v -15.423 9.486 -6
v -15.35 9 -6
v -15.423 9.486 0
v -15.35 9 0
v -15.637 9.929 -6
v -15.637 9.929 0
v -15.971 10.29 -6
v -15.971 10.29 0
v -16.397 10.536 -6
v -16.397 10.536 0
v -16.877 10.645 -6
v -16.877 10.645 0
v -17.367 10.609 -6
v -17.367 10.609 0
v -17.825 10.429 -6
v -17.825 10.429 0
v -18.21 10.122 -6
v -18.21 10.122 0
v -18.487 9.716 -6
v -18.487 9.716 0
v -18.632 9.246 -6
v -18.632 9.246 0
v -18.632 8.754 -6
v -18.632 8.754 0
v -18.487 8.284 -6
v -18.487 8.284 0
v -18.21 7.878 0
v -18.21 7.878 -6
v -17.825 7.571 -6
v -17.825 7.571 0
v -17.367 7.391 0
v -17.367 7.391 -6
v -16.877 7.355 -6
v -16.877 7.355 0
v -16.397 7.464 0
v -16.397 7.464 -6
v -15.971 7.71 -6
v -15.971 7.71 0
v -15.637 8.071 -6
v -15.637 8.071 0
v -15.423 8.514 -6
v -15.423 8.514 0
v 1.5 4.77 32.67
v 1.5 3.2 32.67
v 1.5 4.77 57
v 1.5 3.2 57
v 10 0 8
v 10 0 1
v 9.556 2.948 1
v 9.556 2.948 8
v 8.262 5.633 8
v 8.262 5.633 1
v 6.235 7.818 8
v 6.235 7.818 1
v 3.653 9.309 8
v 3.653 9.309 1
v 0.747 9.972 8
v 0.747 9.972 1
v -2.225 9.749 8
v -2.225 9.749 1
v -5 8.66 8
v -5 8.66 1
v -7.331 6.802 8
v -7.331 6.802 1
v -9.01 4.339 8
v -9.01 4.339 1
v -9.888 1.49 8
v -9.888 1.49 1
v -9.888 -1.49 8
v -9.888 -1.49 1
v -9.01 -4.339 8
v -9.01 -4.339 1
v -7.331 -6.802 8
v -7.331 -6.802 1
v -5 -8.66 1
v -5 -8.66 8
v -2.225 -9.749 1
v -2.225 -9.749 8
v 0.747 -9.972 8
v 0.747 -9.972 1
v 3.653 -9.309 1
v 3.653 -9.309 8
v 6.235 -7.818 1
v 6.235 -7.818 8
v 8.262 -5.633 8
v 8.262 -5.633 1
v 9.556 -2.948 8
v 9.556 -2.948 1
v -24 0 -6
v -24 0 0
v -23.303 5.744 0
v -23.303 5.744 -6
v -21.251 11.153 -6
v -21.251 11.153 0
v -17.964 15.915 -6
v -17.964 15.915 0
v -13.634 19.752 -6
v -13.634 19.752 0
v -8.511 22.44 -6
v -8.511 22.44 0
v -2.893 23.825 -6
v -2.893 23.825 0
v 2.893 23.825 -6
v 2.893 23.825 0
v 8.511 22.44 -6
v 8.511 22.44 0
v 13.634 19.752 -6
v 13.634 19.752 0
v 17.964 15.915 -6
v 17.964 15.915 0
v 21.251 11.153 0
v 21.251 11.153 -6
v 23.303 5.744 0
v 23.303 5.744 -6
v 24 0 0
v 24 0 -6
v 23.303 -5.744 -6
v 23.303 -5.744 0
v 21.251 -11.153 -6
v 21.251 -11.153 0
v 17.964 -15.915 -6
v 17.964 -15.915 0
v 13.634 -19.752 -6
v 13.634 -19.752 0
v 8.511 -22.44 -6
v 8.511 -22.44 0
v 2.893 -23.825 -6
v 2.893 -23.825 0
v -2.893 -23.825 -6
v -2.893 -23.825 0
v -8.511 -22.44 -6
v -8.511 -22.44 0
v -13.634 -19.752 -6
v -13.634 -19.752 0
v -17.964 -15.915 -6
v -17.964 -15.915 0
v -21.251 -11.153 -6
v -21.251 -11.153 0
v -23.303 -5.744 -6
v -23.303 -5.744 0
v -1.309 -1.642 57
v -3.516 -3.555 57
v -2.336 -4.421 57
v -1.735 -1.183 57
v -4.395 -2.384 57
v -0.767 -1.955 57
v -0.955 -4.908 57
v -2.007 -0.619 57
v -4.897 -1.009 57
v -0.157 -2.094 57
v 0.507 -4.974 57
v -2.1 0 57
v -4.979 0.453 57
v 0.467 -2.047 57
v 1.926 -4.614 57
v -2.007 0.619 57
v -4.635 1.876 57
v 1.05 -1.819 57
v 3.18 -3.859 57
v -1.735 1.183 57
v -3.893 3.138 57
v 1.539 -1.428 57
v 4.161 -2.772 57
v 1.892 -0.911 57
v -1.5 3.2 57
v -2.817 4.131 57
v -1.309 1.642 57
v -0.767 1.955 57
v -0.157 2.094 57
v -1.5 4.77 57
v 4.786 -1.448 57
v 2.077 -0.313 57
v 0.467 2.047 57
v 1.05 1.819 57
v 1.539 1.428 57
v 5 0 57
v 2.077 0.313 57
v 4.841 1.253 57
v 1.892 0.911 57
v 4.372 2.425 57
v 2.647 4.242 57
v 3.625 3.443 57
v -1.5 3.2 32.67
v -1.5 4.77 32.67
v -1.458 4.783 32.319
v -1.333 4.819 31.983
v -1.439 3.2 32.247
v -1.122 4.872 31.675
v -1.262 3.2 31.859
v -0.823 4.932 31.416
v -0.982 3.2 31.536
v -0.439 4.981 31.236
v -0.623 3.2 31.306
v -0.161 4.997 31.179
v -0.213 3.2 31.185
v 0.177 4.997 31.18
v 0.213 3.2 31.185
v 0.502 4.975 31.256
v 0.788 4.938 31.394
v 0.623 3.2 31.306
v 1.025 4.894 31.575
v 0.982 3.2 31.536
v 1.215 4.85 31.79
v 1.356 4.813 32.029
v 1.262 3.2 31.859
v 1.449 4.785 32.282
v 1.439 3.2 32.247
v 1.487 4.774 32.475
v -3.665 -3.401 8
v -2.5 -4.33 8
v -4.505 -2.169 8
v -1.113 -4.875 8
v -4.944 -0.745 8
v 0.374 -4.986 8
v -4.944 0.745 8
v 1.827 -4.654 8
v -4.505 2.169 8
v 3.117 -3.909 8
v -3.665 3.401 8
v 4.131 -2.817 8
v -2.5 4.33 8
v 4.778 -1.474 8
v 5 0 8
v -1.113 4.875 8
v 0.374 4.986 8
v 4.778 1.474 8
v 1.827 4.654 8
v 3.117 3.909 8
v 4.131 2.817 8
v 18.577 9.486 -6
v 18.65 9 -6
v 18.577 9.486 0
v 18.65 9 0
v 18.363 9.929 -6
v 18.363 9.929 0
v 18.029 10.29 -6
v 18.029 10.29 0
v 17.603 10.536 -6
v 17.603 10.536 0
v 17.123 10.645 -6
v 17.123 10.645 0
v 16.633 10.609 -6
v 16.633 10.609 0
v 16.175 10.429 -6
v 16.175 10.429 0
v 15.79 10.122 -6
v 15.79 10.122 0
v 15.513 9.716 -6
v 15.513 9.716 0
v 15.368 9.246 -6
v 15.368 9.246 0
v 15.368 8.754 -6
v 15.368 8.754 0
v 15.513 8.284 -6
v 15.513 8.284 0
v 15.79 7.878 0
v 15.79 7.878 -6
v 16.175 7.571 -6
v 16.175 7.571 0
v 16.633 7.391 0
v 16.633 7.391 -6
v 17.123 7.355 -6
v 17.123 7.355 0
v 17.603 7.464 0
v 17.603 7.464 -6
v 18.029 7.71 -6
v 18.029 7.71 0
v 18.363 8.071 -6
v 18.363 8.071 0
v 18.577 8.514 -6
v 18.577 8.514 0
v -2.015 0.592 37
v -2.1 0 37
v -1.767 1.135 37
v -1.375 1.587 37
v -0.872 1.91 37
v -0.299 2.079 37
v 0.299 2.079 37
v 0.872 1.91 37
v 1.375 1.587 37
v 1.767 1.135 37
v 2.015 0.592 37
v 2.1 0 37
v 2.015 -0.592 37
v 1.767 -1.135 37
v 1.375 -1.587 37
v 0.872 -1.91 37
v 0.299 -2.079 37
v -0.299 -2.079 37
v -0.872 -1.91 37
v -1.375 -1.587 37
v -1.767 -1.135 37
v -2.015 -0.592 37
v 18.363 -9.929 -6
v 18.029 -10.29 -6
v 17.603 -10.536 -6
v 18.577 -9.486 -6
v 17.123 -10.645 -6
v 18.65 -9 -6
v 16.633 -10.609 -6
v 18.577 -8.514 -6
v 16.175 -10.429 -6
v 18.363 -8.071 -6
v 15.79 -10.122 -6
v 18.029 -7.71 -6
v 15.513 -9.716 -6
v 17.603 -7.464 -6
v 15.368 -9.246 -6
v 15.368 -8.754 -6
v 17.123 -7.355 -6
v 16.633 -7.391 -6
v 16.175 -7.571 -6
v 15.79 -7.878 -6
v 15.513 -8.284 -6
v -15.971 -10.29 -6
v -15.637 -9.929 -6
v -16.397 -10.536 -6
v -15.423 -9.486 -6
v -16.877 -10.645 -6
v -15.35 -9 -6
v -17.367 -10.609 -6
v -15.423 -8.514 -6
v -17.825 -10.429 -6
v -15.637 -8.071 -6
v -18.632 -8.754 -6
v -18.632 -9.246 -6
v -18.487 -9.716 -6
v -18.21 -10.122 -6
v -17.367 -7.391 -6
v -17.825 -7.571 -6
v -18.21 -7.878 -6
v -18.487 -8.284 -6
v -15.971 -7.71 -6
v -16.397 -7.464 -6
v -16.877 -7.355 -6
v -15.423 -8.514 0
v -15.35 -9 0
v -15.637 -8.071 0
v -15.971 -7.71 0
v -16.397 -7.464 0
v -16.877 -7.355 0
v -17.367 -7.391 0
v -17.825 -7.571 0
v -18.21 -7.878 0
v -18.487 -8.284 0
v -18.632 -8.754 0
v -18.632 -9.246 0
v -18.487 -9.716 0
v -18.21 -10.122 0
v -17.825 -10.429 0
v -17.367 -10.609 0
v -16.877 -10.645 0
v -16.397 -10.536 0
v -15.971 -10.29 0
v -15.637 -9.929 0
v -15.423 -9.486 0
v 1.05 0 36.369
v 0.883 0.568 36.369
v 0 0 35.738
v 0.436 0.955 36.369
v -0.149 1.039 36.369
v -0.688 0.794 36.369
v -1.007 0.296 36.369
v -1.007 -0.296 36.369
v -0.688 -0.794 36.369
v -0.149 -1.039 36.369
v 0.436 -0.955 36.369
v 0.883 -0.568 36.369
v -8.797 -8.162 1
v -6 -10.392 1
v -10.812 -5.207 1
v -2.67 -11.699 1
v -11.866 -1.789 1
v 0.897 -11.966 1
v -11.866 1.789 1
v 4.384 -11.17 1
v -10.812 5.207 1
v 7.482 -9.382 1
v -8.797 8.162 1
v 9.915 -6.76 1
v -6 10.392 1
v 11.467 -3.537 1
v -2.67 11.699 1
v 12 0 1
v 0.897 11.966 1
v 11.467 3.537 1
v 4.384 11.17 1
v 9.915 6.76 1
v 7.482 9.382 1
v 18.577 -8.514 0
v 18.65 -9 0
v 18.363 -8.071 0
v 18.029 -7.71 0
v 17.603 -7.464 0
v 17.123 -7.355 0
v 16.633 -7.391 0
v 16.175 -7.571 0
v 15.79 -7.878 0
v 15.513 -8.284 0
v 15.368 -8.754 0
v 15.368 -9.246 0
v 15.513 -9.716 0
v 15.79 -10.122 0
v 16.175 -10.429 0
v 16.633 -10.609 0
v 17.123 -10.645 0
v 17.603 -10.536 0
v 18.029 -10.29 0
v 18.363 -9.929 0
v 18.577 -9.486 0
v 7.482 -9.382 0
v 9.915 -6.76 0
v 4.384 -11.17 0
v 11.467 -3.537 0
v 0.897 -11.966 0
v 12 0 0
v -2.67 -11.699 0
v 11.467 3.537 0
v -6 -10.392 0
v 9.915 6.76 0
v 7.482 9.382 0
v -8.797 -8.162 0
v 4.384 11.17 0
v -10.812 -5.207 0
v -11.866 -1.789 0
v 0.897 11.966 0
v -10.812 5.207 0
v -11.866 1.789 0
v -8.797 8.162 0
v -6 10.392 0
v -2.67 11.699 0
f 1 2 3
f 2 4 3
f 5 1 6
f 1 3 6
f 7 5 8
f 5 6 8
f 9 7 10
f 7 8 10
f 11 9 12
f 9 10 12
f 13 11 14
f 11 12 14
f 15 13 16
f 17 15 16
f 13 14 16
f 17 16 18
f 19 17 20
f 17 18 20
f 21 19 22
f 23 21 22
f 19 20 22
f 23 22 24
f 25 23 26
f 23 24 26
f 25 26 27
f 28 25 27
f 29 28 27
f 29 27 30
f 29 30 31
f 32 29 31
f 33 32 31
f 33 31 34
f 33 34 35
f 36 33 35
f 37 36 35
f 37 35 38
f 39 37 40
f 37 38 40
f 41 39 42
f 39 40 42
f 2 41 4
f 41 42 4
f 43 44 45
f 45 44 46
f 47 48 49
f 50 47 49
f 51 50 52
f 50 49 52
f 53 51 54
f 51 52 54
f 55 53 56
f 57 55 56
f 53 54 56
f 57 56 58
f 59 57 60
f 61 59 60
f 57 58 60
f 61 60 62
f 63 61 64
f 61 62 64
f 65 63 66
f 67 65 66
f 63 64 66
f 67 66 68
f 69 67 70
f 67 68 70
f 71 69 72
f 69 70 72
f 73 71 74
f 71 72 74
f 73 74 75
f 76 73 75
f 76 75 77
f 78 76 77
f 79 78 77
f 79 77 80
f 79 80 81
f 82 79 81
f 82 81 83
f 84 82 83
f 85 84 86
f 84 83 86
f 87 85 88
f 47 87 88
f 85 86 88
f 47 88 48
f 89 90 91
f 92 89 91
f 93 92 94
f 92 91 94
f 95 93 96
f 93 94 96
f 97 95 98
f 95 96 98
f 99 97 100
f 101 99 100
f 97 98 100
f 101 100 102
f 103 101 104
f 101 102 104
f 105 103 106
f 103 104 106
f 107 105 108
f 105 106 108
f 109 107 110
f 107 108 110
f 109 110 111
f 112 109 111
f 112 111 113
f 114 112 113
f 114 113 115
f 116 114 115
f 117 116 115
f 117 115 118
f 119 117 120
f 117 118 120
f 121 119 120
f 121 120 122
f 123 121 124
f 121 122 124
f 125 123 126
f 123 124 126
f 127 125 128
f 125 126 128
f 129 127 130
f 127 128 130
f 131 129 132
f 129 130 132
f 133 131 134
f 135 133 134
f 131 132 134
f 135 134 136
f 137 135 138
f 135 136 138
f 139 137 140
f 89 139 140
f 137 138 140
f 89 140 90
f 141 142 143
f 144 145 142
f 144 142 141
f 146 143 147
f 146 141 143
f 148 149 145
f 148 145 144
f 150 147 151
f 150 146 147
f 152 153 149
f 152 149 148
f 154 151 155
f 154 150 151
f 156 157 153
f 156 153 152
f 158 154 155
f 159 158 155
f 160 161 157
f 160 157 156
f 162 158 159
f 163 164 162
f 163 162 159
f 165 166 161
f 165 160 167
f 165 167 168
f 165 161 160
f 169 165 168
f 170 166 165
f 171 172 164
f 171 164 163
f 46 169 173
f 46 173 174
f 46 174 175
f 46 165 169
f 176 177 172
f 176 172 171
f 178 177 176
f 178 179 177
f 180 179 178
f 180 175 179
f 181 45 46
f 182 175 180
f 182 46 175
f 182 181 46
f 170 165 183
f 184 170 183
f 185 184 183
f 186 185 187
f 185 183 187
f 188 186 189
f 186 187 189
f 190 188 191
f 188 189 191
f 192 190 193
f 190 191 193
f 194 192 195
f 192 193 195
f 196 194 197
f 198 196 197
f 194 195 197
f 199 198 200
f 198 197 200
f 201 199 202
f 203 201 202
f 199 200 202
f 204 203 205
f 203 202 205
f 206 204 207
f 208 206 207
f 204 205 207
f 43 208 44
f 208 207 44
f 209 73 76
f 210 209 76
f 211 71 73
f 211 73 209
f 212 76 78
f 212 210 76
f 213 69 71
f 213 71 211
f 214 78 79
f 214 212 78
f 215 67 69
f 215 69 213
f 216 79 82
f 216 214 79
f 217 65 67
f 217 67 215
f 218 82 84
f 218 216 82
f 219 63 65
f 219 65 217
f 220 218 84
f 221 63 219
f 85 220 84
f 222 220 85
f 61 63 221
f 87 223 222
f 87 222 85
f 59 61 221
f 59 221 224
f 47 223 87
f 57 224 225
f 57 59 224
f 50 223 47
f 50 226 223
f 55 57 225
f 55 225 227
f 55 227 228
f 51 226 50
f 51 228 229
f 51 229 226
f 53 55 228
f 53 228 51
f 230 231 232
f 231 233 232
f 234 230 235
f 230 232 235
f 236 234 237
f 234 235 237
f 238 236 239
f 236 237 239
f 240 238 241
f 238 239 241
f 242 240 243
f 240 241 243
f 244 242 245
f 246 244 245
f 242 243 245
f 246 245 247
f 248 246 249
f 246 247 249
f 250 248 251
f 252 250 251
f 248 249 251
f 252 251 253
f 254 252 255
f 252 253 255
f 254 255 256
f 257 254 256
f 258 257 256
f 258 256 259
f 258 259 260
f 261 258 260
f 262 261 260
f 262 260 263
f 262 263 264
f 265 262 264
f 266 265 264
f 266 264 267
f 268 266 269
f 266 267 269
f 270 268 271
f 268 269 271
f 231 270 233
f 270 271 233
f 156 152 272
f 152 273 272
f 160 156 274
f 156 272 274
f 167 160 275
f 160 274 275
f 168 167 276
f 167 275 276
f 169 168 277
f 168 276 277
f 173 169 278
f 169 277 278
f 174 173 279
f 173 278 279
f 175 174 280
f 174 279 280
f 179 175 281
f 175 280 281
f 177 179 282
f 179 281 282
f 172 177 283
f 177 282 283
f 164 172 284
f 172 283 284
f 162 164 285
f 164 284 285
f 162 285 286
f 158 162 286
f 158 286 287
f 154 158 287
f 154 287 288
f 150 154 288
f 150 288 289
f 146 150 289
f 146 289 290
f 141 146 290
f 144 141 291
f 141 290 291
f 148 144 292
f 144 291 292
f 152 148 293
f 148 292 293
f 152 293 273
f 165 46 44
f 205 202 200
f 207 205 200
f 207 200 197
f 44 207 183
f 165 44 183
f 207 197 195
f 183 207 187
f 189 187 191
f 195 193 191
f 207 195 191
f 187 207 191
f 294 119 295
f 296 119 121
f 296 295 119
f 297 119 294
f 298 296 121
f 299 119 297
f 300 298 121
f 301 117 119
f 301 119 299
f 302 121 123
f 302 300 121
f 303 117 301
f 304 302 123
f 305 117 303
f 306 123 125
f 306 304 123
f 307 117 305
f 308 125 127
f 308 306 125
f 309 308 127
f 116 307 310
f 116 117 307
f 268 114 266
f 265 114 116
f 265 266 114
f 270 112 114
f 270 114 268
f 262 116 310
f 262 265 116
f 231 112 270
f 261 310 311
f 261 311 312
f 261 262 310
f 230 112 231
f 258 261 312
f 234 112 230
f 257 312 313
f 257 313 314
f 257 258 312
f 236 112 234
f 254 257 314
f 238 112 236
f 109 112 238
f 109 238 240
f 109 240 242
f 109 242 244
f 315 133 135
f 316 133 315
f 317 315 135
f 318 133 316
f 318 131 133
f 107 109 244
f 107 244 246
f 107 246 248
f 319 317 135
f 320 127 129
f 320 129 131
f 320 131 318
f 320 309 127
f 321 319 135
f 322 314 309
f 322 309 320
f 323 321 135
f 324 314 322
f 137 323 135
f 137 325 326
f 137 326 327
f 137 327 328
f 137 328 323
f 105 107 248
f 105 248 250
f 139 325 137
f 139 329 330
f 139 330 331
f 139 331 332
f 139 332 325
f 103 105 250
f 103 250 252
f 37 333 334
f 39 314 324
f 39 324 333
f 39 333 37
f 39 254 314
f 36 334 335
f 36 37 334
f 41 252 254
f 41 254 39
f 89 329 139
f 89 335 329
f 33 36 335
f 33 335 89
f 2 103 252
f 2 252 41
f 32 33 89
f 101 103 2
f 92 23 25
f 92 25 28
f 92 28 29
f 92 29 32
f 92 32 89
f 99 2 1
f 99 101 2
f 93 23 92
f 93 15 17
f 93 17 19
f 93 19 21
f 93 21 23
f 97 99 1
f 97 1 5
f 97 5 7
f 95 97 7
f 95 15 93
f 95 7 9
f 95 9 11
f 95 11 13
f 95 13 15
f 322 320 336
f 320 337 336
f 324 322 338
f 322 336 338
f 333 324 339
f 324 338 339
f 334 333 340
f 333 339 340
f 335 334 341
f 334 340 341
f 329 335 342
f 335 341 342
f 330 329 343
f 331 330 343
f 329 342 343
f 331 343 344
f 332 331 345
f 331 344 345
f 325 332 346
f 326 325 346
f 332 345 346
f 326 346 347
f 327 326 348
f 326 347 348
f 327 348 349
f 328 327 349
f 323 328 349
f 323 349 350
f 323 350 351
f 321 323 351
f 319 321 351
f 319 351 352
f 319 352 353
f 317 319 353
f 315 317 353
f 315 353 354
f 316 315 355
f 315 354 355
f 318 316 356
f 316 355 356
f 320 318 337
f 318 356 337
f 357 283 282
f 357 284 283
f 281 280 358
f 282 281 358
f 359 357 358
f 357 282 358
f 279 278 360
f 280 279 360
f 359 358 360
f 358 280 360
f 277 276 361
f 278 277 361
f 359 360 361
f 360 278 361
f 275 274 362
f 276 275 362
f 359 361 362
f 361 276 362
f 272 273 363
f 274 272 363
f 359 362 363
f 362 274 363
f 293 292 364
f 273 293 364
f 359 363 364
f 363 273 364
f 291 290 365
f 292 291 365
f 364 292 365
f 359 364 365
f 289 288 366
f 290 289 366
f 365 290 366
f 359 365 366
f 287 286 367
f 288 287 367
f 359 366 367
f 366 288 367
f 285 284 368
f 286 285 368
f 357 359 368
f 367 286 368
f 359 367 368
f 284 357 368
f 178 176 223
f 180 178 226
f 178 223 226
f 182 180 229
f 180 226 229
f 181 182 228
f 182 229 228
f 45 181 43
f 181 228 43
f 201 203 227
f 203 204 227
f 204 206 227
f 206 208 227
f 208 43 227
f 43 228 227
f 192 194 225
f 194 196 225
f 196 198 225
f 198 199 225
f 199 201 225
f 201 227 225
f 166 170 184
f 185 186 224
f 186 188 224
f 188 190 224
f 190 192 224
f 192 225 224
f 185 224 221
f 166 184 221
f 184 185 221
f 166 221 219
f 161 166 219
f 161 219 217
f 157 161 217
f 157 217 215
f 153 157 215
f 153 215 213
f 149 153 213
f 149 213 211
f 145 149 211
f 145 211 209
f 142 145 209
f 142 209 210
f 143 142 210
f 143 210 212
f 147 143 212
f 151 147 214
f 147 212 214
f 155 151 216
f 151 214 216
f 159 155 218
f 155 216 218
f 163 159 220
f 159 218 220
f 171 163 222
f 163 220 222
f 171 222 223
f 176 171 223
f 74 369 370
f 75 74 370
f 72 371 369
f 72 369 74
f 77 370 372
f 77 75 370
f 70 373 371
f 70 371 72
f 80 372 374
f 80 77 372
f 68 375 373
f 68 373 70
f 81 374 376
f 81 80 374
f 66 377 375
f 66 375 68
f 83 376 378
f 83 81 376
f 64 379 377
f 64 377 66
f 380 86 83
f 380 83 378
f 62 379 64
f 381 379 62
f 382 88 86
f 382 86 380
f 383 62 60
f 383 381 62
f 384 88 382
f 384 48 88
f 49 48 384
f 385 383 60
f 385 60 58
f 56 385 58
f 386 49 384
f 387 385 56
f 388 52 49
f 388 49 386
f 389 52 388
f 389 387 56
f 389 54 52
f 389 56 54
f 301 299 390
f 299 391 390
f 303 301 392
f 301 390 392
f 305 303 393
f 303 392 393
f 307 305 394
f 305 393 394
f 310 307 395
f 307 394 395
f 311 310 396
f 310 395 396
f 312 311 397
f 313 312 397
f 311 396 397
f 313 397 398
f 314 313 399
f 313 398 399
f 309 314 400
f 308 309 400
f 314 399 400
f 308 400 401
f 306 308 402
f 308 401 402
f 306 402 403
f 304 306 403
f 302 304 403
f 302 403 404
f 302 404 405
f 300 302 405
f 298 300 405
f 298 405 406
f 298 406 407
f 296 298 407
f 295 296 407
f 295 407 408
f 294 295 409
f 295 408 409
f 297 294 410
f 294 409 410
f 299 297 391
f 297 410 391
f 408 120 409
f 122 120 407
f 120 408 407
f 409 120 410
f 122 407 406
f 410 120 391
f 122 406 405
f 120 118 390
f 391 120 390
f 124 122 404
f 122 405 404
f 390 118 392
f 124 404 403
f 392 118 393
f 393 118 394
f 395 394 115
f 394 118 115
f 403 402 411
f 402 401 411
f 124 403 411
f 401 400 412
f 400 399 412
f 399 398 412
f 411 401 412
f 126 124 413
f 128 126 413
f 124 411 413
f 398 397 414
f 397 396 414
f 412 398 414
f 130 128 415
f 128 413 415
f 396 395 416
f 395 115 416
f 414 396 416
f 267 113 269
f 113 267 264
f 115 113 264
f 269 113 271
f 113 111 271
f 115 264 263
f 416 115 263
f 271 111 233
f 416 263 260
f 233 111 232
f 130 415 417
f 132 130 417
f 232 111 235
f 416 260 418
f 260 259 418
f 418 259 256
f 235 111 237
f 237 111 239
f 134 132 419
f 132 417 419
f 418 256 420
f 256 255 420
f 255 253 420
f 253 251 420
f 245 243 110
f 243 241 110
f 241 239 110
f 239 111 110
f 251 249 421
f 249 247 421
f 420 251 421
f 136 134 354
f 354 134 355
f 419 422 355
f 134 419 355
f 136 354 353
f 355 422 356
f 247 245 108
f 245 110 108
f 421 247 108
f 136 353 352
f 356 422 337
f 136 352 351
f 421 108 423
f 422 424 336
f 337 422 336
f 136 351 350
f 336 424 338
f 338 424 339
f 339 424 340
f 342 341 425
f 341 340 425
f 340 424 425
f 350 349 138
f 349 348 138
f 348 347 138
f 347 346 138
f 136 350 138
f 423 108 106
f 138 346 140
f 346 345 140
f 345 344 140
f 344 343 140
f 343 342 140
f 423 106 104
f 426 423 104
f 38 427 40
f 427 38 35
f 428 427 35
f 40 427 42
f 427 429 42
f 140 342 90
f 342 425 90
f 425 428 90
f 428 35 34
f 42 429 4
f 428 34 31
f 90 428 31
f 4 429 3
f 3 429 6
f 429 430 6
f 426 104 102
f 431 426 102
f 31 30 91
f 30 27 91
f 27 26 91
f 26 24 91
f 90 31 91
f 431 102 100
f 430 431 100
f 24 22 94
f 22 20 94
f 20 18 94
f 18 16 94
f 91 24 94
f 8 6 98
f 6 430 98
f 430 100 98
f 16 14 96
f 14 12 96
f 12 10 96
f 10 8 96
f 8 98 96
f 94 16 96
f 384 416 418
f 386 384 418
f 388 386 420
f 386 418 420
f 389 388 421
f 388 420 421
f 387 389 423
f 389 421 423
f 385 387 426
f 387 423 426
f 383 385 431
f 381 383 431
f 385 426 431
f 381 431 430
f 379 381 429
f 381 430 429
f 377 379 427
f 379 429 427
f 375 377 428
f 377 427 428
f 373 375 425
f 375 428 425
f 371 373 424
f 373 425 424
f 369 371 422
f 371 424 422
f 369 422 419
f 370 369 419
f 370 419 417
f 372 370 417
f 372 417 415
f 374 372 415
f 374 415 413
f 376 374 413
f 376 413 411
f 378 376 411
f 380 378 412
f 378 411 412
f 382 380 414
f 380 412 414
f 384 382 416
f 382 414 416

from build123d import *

# Parameters (mm, degrees)
ESQUISSE1_R                                   = 12
BOSS_EXTRU_1_DEPTH                            = 1
ESQUISSE2_R                                   = 24
BOSS_EXTRU_2_DEPTH                            = 6
TROU_POUR_TARAUDAGE_POUR_TROU_TARAUD_M4_D     = 3.3
TROU_POUR_TARAUDAGE_POUR_TROU_TARAUD_M4_DEPTH = 6
TROU_POUR_TARAUDAGE_POUR_TROU_TARAUD_M4_TIP   = 0.991420021
ESQUISSE12_R                                  = 5
BOSS_EXTRU_3_DEPTH                            = 56
TROU_POUR_TARAUDAGE_POUR_TROU_TARAUD_M5_D     = 4.2
TROU_POUR_TARAUDAGE_POUR_TROU_TARAUD_M5_DEPTH = 20
TROU_POUR_TARAUDAGE_POUR_TROU_TARAUD_M5_TIP   = 1.2618073
ENL_V_START                                   = 3.2
ENL_V_MAT_EXTRU_3_DEPTH                       = 21.8
ESQUISSE19_R                                  = 10
BOSS_EXTRU_4_DEPTH                            = 7


with BuildPart() as part:
    # Esquisse1 → Boss.-Extru.1 (new body)
    with BuildSketch(Plane.XY):
        Circle(ESQUISSE1_R)
    extrude(amount=BOSS_EXTRU_1_DEPTH)

    # Esquisse2 → Boss.-Extru.2 (add)
    with BuildSketch(Plane(origin=(0, 0, 0), x_dir=(-1, 0, 0), z_dir=(0, 0, -1))):
        Circle(ESQUISSE2_R)
    extrude(amount=BOSS_EXTRU_2_DEPTH)

    # Trou pour taraudage pour trou taraudé M42
    with Locations(Plane(origin=(0, 0, -6), x_dir=(-1, 0, 0), z_dir=(0, 0, -1))):
        with Locations((-17, 9), (17, -9), (17, 9), (-17, -9)):
            Hole(TROU_POUR_TARAUDAGE_POUR_TROU_TARAUD_M4_D / 2, depth=TROU_POUR_TARAUDAGE_POUR_TROU_TARAUD_M4_DEPTH)
            with Locations((0, 0, -(TROU_POUR_TARAUDAGE_POUR_TROU_TARAUD_M4_DEPTH + TROU_POUR_TARAUDAGE_POUR_TROU_TARAUD_M4_TIP / 2))):  # 118° drill point
                Cone(0, TROU_POUR_TARAUDAGE_POUR_TROU_TARAUD_M4_D / 2, TROU_POUR_TARAUDAGE_POUR_TROU_TARAUD_M4_TIP, mode=Mode.SUBTRACT)

    # Esquisse12 → Boss.-Extru.3 (add)
    with BuildSketch(Plane.XY.offset(1)):
        Circle(ESQUISSE12_R)
    extrude(amount=BOSS_EXTRU_3_DEPTH)

    # Trou pour taraudage pour trou taraudé M51
    with Locations(Plane.XY.offset(57)):
        with Locations((0, 0)):
            Hole(TROU_POUR_TARAUDAGE_POUR_TROU_TARAUD_M5_D / 2, depth=TROU_POUR_TARAUDAGE_POUR_TROU_TARAUD_M5_DEPTH)
            with Locations((0, 0, -(TROU_POUR_TARAUDAGE_POUR_TROU_TARAUD_M5_DEPTH + TROU_POUR_TARAUDAGE_POUR_TROU_TARAUD_M5_TIP / 2))):  # 118° drill point
                Cone(0, TROU_POUR_TARAUDAGE_POUR_TROU_TARAUD_M5_D / 2, TROU_POUR_TARAUDAGE_POUR_TROU_TARAUD_M5_TIP, mode=Mode.SUBTRACT)

    # Esquisse16 → Enlèv. mat.-Extru.3 (cut, through all)
    with BuildSketch(Plane(origin=(0, 0, 0), x_dir=(1, 0, 0), z_dir=(0, 1, 0)).offset(ENL_V_START)):
        with BuildLine():
            Line((-1.5, -57), (-1.5, -32.669951792))
            ThreePointArc((-1.5, -32.669951792), (0, -31.169951792), (1.5, -32.669951792))
            Line((1.5, -32.669951792), (1.5, -57))
            ThreePointArc((1.5, -57), (0, -58.5), (-1.5, -57))
        make_face()
    extrude(amount=ENL_V_MAT_EXTRU_3_DEPTH, mode=Mode.SUBTRACT)

    # Esquisse19 → Boss.-Extru.4 (add)
    with BuildSketch(Plane.XY.offset(1)):
        Circle(ESQUISSE19_R)
    extrude(amount=BOSS_EXTRU_4_DEPTH)


solid = part.part
